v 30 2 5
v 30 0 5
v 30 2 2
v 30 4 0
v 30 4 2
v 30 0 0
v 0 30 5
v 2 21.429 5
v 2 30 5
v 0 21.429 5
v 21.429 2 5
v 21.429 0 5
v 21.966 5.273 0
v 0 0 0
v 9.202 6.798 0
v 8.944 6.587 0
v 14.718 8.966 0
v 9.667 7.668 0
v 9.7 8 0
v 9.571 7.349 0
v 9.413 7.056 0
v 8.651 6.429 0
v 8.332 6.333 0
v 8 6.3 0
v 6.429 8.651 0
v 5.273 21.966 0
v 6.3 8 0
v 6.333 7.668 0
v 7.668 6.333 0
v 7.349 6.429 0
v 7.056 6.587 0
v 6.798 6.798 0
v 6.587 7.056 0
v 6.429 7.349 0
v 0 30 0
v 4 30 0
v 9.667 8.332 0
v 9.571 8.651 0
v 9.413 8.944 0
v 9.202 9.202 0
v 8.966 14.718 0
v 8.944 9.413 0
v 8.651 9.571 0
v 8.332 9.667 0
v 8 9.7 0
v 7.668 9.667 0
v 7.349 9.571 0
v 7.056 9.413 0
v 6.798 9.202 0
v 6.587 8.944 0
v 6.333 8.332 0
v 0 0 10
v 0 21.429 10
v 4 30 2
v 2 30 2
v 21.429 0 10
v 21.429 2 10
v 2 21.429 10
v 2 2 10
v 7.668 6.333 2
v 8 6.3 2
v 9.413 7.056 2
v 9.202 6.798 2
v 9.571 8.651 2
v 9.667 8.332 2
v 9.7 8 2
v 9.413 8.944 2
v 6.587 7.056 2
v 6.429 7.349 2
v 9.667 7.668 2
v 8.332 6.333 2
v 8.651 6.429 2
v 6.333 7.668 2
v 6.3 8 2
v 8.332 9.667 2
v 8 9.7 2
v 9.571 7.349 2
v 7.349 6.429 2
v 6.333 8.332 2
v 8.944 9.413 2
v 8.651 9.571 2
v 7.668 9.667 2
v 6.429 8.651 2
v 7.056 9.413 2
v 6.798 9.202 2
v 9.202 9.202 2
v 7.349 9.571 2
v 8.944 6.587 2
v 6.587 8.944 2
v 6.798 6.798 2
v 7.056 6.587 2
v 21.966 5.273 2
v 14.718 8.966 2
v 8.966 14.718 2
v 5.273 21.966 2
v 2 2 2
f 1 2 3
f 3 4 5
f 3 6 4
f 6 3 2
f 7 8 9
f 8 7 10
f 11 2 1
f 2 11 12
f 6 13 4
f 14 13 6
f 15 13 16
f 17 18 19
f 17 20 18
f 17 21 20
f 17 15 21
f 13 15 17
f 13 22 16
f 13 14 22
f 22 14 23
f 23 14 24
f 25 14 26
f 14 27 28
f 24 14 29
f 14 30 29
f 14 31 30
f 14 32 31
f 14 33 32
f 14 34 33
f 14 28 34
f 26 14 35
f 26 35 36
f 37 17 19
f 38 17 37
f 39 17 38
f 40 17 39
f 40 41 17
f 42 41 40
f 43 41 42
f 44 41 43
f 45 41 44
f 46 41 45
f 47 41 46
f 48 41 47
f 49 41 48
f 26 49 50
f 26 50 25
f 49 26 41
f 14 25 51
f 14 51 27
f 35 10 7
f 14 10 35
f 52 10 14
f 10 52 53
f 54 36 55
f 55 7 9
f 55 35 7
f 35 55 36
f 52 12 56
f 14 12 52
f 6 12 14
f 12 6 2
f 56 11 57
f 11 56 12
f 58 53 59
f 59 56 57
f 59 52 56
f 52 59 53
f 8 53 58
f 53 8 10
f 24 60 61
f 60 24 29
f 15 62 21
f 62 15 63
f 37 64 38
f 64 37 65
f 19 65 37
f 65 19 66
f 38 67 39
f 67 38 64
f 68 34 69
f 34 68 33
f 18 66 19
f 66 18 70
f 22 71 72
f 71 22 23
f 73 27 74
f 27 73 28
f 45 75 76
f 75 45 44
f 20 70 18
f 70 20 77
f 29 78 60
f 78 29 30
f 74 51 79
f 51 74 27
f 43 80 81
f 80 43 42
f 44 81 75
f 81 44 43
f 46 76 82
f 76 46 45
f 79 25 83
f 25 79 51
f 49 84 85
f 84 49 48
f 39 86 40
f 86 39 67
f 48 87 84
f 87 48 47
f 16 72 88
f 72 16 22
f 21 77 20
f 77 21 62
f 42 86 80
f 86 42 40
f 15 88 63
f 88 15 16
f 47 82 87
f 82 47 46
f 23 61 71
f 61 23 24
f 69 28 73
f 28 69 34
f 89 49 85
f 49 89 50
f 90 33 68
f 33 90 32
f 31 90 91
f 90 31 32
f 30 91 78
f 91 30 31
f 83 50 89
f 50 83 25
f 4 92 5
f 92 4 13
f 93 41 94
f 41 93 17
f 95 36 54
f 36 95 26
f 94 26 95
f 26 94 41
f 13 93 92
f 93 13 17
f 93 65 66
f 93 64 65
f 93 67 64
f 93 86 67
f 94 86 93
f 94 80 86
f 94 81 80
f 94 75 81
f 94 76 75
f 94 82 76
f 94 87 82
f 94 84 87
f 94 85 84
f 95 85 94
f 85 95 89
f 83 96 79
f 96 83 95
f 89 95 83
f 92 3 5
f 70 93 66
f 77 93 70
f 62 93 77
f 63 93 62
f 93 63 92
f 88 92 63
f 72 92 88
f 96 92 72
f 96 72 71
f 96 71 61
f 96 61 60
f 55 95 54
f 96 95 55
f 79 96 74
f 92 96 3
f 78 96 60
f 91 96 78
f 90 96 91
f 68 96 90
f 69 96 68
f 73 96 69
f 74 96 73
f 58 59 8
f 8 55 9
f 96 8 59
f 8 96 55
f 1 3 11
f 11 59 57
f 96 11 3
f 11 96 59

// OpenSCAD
$fn=32;

boltX = 8;
boltY = 8;

cx = 30;
cy = 30;
cz = 5;

mcx = cx/1.4;
mcy = cy/1.4;
mcz = 10;

fascX = 2;
fascY = 2;
fascZ = 2;

sliceX = 0;
sliceY = 0;
sliceDia = 52;

difference() {
  union() {
    cube([cx, cy, cz]);
    cube([mcx, mcy, mcz]);
  }
  color("Blue") {
      translate([fascX, fascY, fascZ]) cube([cx, cy, cz*2]);
  }
  color("Red") {
    translate([boltX, boltY, -10]) cylinder(d=3.4, h=50);
    translate([cx + sliceX, cy + sliceY, -cz]) cylinder(d=sliceDia, h=cz*3, $fn=20);
  }
}
